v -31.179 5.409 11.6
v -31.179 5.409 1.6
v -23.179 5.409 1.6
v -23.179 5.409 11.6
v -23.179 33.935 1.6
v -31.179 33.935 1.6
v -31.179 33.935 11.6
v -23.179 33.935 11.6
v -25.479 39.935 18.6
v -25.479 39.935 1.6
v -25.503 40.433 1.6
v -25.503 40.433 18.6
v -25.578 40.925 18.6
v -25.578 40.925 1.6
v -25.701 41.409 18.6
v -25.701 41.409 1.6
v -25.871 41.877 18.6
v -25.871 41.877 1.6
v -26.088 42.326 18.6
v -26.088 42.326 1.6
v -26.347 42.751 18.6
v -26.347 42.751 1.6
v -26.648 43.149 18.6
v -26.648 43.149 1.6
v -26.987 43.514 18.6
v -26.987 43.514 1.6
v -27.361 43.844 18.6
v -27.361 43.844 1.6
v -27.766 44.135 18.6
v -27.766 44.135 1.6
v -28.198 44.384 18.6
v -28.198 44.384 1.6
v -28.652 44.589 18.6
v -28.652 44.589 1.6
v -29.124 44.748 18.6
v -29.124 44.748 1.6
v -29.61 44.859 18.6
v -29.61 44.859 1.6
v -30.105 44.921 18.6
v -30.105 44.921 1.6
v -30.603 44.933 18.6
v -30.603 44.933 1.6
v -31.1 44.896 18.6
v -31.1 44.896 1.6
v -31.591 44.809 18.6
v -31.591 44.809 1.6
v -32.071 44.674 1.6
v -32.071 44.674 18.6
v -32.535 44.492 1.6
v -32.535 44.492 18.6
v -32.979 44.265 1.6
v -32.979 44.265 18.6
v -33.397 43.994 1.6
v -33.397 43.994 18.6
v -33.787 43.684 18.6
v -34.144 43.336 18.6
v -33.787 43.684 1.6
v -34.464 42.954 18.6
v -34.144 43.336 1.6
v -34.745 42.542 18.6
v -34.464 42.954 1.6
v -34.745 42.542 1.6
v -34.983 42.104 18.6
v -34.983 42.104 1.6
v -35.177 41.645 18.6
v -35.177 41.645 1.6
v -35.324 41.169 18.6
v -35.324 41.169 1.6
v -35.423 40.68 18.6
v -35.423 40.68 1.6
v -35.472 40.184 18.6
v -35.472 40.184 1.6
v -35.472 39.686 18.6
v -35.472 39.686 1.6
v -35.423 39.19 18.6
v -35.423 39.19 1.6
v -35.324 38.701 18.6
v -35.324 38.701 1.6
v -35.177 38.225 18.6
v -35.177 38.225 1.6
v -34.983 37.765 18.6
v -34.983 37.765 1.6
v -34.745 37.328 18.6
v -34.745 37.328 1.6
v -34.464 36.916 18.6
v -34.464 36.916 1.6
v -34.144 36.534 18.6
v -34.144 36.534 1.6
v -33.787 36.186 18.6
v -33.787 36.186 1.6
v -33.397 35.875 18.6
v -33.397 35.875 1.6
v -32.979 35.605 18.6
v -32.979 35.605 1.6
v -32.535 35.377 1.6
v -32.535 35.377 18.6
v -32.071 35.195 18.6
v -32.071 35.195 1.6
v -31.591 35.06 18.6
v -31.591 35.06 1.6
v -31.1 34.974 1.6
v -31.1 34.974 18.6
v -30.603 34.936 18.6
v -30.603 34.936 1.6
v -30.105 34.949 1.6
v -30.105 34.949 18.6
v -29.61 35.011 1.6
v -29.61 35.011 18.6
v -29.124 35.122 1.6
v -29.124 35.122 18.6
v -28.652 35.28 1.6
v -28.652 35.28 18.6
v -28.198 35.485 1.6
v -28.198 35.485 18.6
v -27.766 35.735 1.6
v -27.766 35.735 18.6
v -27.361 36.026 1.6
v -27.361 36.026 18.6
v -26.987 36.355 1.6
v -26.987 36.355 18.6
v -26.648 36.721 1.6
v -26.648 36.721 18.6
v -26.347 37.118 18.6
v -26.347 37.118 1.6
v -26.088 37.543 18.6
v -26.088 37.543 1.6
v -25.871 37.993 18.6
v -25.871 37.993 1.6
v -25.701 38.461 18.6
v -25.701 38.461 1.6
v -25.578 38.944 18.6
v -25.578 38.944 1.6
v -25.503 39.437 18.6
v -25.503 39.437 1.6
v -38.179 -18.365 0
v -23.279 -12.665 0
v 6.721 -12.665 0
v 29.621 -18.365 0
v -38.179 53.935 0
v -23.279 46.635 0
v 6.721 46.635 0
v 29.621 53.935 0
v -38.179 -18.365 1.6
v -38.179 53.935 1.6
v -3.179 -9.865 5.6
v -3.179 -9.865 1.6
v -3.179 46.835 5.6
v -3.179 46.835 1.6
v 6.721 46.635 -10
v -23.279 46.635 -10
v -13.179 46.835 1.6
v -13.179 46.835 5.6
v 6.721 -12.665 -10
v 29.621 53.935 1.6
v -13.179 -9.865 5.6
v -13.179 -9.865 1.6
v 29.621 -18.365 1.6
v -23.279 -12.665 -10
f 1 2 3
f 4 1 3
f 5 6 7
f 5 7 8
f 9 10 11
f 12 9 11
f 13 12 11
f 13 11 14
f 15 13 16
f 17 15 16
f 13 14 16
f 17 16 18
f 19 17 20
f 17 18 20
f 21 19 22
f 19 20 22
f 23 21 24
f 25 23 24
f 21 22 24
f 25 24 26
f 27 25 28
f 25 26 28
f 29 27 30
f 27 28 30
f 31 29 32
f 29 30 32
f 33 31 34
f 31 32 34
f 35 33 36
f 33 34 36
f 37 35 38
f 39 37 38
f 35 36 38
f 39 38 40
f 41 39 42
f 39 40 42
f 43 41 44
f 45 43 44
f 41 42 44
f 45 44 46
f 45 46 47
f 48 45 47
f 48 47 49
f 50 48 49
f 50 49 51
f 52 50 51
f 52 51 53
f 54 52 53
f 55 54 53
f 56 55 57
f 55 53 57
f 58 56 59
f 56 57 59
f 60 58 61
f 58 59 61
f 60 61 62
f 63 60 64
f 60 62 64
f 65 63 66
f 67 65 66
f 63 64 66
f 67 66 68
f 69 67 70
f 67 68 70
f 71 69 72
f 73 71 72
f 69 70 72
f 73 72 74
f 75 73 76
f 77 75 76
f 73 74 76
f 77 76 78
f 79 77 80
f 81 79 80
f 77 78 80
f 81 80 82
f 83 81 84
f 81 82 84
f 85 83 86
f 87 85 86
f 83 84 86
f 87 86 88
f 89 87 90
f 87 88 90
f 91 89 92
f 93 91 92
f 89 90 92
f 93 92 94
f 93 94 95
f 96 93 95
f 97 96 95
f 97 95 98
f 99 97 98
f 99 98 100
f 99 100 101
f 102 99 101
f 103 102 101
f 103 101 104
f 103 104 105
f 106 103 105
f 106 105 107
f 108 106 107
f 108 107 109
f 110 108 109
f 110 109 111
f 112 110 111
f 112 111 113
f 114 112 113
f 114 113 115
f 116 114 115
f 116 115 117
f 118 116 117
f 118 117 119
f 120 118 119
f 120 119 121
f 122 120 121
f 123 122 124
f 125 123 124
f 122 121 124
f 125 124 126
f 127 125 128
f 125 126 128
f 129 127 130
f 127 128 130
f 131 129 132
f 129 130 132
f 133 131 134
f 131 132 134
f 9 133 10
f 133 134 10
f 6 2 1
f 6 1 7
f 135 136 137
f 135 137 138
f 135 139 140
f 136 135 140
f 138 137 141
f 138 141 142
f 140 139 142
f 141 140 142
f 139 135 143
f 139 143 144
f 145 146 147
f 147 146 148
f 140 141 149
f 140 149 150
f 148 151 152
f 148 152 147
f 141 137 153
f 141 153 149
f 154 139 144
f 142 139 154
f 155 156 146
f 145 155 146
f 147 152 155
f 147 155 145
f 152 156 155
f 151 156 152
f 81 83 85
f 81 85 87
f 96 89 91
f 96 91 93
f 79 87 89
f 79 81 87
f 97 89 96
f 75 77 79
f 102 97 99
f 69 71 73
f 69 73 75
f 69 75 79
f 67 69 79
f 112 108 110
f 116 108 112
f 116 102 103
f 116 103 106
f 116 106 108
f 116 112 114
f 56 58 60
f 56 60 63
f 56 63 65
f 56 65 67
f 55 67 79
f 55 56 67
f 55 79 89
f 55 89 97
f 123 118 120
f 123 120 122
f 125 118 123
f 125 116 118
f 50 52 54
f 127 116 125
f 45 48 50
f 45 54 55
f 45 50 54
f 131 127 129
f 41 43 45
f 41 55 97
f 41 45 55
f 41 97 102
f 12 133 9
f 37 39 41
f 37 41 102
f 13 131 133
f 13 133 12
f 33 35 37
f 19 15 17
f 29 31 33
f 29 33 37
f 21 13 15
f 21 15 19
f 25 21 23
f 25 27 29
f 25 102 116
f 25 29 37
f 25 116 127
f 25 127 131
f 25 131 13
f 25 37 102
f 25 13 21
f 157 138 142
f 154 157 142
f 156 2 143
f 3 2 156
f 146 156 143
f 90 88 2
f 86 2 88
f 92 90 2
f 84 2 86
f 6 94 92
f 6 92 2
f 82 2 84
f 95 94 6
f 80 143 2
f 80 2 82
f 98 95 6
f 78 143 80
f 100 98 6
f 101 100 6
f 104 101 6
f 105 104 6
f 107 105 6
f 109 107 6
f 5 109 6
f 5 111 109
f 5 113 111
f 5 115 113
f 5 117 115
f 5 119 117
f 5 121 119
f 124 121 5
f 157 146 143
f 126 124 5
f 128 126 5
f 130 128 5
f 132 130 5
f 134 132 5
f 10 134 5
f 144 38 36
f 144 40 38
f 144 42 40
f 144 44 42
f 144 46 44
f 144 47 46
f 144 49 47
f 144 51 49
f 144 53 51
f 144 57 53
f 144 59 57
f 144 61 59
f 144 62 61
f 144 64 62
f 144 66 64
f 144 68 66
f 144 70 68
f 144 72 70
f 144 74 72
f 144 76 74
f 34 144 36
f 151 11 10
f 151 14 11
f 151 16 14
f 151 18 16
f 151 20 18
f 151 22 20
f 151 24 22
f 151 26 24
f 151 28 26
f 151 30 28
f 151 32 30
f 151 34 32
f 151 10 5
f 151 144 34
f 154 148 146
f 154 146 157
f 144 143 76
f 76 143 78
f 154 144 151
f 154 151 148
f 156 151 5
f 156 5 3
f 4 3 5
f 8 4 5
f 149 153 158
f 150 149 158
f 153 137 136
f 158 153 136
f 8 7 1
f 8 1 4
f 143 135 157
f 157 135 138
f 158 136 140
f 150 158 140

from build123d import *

# Parameters (mm, degrees)
SKETCH1_W           = 67.8
SKETCH1_H           = 72.3
BOSS_EXTRUDE1_DEPTH = 1.6
SKETCH3_W           = 10
SKETCH3_H           = 56.699897886
BOSS_EXTRUDE2_DEPTH = 4
SKETCH4_W           = 8
SKETCH4_H           = 28.525313837
BOSS_EXTRUDE3_DEPTH = 10
SKETCH5_R           = 5
BOSS_EXTRUDE4_DEPTH = 17
SKETCH6_W           = 30
SKETCH6_H           = 59.3
BOSS_EXTRUDE5_DEPTH = 10


with BuildPart() as part:
    # Sketch1 → Boss-Extrude1 (new body)
    with BuildSketch(Plane.XY):
        with Locations((-4.278640777, 17.784757282)):
            Rectangle(SKETCH1_W, SKETCH1_H)
    extrude(amount=BOSS_EXTRUDE1_DEPTH)

    # Sketch3 → Boss-Extrude2 (add)
    with BuildSketch(Plane.XY.offset(1.6)):
        with Locations((-8.178640777, 18.484808339)):
            Rectangle(SKETCH3_W, SKETCH3_H)
    extrude(amount=BOSS_EXTRUDE2_DEPTH)

    # Sketch4 → Boss-Extrude3 (add)
    with BuildSketch(Plane.XY.offset(1.6)):
        with Locations((-27.178640777, 19.672100364)):
            Rectangle(SKETCH4_W, SKETCH4_H)
    extrude(amount=BOSS_EXTRUDE3_DEPTH)

    # Sketch5 → Boss-Extrude4 (add)
    with BuildSketch(Plane.XY.offset(1.6)):
        with Locations((-30.478640777, 39.934757282)):
            Circle(SKETCH5_R)
    extrude(amount=BOSS_EXTRUDE4_DEPTH)

    # Sketch6 → Boss-Extrude5 (add)
    with BuildSketch(Plane(origin=(0, 0, 0), x_dir=(-1, 0, 0), z_dir=(0, 0, -1))):
        with Locations((8.278640777, 16.984757282)):
            Rectangle(SKETCH6_W, SKETCH6_H)
    extrude(amount=BOSS_EXTRUDE5_DEPTH)


solid = part.part
